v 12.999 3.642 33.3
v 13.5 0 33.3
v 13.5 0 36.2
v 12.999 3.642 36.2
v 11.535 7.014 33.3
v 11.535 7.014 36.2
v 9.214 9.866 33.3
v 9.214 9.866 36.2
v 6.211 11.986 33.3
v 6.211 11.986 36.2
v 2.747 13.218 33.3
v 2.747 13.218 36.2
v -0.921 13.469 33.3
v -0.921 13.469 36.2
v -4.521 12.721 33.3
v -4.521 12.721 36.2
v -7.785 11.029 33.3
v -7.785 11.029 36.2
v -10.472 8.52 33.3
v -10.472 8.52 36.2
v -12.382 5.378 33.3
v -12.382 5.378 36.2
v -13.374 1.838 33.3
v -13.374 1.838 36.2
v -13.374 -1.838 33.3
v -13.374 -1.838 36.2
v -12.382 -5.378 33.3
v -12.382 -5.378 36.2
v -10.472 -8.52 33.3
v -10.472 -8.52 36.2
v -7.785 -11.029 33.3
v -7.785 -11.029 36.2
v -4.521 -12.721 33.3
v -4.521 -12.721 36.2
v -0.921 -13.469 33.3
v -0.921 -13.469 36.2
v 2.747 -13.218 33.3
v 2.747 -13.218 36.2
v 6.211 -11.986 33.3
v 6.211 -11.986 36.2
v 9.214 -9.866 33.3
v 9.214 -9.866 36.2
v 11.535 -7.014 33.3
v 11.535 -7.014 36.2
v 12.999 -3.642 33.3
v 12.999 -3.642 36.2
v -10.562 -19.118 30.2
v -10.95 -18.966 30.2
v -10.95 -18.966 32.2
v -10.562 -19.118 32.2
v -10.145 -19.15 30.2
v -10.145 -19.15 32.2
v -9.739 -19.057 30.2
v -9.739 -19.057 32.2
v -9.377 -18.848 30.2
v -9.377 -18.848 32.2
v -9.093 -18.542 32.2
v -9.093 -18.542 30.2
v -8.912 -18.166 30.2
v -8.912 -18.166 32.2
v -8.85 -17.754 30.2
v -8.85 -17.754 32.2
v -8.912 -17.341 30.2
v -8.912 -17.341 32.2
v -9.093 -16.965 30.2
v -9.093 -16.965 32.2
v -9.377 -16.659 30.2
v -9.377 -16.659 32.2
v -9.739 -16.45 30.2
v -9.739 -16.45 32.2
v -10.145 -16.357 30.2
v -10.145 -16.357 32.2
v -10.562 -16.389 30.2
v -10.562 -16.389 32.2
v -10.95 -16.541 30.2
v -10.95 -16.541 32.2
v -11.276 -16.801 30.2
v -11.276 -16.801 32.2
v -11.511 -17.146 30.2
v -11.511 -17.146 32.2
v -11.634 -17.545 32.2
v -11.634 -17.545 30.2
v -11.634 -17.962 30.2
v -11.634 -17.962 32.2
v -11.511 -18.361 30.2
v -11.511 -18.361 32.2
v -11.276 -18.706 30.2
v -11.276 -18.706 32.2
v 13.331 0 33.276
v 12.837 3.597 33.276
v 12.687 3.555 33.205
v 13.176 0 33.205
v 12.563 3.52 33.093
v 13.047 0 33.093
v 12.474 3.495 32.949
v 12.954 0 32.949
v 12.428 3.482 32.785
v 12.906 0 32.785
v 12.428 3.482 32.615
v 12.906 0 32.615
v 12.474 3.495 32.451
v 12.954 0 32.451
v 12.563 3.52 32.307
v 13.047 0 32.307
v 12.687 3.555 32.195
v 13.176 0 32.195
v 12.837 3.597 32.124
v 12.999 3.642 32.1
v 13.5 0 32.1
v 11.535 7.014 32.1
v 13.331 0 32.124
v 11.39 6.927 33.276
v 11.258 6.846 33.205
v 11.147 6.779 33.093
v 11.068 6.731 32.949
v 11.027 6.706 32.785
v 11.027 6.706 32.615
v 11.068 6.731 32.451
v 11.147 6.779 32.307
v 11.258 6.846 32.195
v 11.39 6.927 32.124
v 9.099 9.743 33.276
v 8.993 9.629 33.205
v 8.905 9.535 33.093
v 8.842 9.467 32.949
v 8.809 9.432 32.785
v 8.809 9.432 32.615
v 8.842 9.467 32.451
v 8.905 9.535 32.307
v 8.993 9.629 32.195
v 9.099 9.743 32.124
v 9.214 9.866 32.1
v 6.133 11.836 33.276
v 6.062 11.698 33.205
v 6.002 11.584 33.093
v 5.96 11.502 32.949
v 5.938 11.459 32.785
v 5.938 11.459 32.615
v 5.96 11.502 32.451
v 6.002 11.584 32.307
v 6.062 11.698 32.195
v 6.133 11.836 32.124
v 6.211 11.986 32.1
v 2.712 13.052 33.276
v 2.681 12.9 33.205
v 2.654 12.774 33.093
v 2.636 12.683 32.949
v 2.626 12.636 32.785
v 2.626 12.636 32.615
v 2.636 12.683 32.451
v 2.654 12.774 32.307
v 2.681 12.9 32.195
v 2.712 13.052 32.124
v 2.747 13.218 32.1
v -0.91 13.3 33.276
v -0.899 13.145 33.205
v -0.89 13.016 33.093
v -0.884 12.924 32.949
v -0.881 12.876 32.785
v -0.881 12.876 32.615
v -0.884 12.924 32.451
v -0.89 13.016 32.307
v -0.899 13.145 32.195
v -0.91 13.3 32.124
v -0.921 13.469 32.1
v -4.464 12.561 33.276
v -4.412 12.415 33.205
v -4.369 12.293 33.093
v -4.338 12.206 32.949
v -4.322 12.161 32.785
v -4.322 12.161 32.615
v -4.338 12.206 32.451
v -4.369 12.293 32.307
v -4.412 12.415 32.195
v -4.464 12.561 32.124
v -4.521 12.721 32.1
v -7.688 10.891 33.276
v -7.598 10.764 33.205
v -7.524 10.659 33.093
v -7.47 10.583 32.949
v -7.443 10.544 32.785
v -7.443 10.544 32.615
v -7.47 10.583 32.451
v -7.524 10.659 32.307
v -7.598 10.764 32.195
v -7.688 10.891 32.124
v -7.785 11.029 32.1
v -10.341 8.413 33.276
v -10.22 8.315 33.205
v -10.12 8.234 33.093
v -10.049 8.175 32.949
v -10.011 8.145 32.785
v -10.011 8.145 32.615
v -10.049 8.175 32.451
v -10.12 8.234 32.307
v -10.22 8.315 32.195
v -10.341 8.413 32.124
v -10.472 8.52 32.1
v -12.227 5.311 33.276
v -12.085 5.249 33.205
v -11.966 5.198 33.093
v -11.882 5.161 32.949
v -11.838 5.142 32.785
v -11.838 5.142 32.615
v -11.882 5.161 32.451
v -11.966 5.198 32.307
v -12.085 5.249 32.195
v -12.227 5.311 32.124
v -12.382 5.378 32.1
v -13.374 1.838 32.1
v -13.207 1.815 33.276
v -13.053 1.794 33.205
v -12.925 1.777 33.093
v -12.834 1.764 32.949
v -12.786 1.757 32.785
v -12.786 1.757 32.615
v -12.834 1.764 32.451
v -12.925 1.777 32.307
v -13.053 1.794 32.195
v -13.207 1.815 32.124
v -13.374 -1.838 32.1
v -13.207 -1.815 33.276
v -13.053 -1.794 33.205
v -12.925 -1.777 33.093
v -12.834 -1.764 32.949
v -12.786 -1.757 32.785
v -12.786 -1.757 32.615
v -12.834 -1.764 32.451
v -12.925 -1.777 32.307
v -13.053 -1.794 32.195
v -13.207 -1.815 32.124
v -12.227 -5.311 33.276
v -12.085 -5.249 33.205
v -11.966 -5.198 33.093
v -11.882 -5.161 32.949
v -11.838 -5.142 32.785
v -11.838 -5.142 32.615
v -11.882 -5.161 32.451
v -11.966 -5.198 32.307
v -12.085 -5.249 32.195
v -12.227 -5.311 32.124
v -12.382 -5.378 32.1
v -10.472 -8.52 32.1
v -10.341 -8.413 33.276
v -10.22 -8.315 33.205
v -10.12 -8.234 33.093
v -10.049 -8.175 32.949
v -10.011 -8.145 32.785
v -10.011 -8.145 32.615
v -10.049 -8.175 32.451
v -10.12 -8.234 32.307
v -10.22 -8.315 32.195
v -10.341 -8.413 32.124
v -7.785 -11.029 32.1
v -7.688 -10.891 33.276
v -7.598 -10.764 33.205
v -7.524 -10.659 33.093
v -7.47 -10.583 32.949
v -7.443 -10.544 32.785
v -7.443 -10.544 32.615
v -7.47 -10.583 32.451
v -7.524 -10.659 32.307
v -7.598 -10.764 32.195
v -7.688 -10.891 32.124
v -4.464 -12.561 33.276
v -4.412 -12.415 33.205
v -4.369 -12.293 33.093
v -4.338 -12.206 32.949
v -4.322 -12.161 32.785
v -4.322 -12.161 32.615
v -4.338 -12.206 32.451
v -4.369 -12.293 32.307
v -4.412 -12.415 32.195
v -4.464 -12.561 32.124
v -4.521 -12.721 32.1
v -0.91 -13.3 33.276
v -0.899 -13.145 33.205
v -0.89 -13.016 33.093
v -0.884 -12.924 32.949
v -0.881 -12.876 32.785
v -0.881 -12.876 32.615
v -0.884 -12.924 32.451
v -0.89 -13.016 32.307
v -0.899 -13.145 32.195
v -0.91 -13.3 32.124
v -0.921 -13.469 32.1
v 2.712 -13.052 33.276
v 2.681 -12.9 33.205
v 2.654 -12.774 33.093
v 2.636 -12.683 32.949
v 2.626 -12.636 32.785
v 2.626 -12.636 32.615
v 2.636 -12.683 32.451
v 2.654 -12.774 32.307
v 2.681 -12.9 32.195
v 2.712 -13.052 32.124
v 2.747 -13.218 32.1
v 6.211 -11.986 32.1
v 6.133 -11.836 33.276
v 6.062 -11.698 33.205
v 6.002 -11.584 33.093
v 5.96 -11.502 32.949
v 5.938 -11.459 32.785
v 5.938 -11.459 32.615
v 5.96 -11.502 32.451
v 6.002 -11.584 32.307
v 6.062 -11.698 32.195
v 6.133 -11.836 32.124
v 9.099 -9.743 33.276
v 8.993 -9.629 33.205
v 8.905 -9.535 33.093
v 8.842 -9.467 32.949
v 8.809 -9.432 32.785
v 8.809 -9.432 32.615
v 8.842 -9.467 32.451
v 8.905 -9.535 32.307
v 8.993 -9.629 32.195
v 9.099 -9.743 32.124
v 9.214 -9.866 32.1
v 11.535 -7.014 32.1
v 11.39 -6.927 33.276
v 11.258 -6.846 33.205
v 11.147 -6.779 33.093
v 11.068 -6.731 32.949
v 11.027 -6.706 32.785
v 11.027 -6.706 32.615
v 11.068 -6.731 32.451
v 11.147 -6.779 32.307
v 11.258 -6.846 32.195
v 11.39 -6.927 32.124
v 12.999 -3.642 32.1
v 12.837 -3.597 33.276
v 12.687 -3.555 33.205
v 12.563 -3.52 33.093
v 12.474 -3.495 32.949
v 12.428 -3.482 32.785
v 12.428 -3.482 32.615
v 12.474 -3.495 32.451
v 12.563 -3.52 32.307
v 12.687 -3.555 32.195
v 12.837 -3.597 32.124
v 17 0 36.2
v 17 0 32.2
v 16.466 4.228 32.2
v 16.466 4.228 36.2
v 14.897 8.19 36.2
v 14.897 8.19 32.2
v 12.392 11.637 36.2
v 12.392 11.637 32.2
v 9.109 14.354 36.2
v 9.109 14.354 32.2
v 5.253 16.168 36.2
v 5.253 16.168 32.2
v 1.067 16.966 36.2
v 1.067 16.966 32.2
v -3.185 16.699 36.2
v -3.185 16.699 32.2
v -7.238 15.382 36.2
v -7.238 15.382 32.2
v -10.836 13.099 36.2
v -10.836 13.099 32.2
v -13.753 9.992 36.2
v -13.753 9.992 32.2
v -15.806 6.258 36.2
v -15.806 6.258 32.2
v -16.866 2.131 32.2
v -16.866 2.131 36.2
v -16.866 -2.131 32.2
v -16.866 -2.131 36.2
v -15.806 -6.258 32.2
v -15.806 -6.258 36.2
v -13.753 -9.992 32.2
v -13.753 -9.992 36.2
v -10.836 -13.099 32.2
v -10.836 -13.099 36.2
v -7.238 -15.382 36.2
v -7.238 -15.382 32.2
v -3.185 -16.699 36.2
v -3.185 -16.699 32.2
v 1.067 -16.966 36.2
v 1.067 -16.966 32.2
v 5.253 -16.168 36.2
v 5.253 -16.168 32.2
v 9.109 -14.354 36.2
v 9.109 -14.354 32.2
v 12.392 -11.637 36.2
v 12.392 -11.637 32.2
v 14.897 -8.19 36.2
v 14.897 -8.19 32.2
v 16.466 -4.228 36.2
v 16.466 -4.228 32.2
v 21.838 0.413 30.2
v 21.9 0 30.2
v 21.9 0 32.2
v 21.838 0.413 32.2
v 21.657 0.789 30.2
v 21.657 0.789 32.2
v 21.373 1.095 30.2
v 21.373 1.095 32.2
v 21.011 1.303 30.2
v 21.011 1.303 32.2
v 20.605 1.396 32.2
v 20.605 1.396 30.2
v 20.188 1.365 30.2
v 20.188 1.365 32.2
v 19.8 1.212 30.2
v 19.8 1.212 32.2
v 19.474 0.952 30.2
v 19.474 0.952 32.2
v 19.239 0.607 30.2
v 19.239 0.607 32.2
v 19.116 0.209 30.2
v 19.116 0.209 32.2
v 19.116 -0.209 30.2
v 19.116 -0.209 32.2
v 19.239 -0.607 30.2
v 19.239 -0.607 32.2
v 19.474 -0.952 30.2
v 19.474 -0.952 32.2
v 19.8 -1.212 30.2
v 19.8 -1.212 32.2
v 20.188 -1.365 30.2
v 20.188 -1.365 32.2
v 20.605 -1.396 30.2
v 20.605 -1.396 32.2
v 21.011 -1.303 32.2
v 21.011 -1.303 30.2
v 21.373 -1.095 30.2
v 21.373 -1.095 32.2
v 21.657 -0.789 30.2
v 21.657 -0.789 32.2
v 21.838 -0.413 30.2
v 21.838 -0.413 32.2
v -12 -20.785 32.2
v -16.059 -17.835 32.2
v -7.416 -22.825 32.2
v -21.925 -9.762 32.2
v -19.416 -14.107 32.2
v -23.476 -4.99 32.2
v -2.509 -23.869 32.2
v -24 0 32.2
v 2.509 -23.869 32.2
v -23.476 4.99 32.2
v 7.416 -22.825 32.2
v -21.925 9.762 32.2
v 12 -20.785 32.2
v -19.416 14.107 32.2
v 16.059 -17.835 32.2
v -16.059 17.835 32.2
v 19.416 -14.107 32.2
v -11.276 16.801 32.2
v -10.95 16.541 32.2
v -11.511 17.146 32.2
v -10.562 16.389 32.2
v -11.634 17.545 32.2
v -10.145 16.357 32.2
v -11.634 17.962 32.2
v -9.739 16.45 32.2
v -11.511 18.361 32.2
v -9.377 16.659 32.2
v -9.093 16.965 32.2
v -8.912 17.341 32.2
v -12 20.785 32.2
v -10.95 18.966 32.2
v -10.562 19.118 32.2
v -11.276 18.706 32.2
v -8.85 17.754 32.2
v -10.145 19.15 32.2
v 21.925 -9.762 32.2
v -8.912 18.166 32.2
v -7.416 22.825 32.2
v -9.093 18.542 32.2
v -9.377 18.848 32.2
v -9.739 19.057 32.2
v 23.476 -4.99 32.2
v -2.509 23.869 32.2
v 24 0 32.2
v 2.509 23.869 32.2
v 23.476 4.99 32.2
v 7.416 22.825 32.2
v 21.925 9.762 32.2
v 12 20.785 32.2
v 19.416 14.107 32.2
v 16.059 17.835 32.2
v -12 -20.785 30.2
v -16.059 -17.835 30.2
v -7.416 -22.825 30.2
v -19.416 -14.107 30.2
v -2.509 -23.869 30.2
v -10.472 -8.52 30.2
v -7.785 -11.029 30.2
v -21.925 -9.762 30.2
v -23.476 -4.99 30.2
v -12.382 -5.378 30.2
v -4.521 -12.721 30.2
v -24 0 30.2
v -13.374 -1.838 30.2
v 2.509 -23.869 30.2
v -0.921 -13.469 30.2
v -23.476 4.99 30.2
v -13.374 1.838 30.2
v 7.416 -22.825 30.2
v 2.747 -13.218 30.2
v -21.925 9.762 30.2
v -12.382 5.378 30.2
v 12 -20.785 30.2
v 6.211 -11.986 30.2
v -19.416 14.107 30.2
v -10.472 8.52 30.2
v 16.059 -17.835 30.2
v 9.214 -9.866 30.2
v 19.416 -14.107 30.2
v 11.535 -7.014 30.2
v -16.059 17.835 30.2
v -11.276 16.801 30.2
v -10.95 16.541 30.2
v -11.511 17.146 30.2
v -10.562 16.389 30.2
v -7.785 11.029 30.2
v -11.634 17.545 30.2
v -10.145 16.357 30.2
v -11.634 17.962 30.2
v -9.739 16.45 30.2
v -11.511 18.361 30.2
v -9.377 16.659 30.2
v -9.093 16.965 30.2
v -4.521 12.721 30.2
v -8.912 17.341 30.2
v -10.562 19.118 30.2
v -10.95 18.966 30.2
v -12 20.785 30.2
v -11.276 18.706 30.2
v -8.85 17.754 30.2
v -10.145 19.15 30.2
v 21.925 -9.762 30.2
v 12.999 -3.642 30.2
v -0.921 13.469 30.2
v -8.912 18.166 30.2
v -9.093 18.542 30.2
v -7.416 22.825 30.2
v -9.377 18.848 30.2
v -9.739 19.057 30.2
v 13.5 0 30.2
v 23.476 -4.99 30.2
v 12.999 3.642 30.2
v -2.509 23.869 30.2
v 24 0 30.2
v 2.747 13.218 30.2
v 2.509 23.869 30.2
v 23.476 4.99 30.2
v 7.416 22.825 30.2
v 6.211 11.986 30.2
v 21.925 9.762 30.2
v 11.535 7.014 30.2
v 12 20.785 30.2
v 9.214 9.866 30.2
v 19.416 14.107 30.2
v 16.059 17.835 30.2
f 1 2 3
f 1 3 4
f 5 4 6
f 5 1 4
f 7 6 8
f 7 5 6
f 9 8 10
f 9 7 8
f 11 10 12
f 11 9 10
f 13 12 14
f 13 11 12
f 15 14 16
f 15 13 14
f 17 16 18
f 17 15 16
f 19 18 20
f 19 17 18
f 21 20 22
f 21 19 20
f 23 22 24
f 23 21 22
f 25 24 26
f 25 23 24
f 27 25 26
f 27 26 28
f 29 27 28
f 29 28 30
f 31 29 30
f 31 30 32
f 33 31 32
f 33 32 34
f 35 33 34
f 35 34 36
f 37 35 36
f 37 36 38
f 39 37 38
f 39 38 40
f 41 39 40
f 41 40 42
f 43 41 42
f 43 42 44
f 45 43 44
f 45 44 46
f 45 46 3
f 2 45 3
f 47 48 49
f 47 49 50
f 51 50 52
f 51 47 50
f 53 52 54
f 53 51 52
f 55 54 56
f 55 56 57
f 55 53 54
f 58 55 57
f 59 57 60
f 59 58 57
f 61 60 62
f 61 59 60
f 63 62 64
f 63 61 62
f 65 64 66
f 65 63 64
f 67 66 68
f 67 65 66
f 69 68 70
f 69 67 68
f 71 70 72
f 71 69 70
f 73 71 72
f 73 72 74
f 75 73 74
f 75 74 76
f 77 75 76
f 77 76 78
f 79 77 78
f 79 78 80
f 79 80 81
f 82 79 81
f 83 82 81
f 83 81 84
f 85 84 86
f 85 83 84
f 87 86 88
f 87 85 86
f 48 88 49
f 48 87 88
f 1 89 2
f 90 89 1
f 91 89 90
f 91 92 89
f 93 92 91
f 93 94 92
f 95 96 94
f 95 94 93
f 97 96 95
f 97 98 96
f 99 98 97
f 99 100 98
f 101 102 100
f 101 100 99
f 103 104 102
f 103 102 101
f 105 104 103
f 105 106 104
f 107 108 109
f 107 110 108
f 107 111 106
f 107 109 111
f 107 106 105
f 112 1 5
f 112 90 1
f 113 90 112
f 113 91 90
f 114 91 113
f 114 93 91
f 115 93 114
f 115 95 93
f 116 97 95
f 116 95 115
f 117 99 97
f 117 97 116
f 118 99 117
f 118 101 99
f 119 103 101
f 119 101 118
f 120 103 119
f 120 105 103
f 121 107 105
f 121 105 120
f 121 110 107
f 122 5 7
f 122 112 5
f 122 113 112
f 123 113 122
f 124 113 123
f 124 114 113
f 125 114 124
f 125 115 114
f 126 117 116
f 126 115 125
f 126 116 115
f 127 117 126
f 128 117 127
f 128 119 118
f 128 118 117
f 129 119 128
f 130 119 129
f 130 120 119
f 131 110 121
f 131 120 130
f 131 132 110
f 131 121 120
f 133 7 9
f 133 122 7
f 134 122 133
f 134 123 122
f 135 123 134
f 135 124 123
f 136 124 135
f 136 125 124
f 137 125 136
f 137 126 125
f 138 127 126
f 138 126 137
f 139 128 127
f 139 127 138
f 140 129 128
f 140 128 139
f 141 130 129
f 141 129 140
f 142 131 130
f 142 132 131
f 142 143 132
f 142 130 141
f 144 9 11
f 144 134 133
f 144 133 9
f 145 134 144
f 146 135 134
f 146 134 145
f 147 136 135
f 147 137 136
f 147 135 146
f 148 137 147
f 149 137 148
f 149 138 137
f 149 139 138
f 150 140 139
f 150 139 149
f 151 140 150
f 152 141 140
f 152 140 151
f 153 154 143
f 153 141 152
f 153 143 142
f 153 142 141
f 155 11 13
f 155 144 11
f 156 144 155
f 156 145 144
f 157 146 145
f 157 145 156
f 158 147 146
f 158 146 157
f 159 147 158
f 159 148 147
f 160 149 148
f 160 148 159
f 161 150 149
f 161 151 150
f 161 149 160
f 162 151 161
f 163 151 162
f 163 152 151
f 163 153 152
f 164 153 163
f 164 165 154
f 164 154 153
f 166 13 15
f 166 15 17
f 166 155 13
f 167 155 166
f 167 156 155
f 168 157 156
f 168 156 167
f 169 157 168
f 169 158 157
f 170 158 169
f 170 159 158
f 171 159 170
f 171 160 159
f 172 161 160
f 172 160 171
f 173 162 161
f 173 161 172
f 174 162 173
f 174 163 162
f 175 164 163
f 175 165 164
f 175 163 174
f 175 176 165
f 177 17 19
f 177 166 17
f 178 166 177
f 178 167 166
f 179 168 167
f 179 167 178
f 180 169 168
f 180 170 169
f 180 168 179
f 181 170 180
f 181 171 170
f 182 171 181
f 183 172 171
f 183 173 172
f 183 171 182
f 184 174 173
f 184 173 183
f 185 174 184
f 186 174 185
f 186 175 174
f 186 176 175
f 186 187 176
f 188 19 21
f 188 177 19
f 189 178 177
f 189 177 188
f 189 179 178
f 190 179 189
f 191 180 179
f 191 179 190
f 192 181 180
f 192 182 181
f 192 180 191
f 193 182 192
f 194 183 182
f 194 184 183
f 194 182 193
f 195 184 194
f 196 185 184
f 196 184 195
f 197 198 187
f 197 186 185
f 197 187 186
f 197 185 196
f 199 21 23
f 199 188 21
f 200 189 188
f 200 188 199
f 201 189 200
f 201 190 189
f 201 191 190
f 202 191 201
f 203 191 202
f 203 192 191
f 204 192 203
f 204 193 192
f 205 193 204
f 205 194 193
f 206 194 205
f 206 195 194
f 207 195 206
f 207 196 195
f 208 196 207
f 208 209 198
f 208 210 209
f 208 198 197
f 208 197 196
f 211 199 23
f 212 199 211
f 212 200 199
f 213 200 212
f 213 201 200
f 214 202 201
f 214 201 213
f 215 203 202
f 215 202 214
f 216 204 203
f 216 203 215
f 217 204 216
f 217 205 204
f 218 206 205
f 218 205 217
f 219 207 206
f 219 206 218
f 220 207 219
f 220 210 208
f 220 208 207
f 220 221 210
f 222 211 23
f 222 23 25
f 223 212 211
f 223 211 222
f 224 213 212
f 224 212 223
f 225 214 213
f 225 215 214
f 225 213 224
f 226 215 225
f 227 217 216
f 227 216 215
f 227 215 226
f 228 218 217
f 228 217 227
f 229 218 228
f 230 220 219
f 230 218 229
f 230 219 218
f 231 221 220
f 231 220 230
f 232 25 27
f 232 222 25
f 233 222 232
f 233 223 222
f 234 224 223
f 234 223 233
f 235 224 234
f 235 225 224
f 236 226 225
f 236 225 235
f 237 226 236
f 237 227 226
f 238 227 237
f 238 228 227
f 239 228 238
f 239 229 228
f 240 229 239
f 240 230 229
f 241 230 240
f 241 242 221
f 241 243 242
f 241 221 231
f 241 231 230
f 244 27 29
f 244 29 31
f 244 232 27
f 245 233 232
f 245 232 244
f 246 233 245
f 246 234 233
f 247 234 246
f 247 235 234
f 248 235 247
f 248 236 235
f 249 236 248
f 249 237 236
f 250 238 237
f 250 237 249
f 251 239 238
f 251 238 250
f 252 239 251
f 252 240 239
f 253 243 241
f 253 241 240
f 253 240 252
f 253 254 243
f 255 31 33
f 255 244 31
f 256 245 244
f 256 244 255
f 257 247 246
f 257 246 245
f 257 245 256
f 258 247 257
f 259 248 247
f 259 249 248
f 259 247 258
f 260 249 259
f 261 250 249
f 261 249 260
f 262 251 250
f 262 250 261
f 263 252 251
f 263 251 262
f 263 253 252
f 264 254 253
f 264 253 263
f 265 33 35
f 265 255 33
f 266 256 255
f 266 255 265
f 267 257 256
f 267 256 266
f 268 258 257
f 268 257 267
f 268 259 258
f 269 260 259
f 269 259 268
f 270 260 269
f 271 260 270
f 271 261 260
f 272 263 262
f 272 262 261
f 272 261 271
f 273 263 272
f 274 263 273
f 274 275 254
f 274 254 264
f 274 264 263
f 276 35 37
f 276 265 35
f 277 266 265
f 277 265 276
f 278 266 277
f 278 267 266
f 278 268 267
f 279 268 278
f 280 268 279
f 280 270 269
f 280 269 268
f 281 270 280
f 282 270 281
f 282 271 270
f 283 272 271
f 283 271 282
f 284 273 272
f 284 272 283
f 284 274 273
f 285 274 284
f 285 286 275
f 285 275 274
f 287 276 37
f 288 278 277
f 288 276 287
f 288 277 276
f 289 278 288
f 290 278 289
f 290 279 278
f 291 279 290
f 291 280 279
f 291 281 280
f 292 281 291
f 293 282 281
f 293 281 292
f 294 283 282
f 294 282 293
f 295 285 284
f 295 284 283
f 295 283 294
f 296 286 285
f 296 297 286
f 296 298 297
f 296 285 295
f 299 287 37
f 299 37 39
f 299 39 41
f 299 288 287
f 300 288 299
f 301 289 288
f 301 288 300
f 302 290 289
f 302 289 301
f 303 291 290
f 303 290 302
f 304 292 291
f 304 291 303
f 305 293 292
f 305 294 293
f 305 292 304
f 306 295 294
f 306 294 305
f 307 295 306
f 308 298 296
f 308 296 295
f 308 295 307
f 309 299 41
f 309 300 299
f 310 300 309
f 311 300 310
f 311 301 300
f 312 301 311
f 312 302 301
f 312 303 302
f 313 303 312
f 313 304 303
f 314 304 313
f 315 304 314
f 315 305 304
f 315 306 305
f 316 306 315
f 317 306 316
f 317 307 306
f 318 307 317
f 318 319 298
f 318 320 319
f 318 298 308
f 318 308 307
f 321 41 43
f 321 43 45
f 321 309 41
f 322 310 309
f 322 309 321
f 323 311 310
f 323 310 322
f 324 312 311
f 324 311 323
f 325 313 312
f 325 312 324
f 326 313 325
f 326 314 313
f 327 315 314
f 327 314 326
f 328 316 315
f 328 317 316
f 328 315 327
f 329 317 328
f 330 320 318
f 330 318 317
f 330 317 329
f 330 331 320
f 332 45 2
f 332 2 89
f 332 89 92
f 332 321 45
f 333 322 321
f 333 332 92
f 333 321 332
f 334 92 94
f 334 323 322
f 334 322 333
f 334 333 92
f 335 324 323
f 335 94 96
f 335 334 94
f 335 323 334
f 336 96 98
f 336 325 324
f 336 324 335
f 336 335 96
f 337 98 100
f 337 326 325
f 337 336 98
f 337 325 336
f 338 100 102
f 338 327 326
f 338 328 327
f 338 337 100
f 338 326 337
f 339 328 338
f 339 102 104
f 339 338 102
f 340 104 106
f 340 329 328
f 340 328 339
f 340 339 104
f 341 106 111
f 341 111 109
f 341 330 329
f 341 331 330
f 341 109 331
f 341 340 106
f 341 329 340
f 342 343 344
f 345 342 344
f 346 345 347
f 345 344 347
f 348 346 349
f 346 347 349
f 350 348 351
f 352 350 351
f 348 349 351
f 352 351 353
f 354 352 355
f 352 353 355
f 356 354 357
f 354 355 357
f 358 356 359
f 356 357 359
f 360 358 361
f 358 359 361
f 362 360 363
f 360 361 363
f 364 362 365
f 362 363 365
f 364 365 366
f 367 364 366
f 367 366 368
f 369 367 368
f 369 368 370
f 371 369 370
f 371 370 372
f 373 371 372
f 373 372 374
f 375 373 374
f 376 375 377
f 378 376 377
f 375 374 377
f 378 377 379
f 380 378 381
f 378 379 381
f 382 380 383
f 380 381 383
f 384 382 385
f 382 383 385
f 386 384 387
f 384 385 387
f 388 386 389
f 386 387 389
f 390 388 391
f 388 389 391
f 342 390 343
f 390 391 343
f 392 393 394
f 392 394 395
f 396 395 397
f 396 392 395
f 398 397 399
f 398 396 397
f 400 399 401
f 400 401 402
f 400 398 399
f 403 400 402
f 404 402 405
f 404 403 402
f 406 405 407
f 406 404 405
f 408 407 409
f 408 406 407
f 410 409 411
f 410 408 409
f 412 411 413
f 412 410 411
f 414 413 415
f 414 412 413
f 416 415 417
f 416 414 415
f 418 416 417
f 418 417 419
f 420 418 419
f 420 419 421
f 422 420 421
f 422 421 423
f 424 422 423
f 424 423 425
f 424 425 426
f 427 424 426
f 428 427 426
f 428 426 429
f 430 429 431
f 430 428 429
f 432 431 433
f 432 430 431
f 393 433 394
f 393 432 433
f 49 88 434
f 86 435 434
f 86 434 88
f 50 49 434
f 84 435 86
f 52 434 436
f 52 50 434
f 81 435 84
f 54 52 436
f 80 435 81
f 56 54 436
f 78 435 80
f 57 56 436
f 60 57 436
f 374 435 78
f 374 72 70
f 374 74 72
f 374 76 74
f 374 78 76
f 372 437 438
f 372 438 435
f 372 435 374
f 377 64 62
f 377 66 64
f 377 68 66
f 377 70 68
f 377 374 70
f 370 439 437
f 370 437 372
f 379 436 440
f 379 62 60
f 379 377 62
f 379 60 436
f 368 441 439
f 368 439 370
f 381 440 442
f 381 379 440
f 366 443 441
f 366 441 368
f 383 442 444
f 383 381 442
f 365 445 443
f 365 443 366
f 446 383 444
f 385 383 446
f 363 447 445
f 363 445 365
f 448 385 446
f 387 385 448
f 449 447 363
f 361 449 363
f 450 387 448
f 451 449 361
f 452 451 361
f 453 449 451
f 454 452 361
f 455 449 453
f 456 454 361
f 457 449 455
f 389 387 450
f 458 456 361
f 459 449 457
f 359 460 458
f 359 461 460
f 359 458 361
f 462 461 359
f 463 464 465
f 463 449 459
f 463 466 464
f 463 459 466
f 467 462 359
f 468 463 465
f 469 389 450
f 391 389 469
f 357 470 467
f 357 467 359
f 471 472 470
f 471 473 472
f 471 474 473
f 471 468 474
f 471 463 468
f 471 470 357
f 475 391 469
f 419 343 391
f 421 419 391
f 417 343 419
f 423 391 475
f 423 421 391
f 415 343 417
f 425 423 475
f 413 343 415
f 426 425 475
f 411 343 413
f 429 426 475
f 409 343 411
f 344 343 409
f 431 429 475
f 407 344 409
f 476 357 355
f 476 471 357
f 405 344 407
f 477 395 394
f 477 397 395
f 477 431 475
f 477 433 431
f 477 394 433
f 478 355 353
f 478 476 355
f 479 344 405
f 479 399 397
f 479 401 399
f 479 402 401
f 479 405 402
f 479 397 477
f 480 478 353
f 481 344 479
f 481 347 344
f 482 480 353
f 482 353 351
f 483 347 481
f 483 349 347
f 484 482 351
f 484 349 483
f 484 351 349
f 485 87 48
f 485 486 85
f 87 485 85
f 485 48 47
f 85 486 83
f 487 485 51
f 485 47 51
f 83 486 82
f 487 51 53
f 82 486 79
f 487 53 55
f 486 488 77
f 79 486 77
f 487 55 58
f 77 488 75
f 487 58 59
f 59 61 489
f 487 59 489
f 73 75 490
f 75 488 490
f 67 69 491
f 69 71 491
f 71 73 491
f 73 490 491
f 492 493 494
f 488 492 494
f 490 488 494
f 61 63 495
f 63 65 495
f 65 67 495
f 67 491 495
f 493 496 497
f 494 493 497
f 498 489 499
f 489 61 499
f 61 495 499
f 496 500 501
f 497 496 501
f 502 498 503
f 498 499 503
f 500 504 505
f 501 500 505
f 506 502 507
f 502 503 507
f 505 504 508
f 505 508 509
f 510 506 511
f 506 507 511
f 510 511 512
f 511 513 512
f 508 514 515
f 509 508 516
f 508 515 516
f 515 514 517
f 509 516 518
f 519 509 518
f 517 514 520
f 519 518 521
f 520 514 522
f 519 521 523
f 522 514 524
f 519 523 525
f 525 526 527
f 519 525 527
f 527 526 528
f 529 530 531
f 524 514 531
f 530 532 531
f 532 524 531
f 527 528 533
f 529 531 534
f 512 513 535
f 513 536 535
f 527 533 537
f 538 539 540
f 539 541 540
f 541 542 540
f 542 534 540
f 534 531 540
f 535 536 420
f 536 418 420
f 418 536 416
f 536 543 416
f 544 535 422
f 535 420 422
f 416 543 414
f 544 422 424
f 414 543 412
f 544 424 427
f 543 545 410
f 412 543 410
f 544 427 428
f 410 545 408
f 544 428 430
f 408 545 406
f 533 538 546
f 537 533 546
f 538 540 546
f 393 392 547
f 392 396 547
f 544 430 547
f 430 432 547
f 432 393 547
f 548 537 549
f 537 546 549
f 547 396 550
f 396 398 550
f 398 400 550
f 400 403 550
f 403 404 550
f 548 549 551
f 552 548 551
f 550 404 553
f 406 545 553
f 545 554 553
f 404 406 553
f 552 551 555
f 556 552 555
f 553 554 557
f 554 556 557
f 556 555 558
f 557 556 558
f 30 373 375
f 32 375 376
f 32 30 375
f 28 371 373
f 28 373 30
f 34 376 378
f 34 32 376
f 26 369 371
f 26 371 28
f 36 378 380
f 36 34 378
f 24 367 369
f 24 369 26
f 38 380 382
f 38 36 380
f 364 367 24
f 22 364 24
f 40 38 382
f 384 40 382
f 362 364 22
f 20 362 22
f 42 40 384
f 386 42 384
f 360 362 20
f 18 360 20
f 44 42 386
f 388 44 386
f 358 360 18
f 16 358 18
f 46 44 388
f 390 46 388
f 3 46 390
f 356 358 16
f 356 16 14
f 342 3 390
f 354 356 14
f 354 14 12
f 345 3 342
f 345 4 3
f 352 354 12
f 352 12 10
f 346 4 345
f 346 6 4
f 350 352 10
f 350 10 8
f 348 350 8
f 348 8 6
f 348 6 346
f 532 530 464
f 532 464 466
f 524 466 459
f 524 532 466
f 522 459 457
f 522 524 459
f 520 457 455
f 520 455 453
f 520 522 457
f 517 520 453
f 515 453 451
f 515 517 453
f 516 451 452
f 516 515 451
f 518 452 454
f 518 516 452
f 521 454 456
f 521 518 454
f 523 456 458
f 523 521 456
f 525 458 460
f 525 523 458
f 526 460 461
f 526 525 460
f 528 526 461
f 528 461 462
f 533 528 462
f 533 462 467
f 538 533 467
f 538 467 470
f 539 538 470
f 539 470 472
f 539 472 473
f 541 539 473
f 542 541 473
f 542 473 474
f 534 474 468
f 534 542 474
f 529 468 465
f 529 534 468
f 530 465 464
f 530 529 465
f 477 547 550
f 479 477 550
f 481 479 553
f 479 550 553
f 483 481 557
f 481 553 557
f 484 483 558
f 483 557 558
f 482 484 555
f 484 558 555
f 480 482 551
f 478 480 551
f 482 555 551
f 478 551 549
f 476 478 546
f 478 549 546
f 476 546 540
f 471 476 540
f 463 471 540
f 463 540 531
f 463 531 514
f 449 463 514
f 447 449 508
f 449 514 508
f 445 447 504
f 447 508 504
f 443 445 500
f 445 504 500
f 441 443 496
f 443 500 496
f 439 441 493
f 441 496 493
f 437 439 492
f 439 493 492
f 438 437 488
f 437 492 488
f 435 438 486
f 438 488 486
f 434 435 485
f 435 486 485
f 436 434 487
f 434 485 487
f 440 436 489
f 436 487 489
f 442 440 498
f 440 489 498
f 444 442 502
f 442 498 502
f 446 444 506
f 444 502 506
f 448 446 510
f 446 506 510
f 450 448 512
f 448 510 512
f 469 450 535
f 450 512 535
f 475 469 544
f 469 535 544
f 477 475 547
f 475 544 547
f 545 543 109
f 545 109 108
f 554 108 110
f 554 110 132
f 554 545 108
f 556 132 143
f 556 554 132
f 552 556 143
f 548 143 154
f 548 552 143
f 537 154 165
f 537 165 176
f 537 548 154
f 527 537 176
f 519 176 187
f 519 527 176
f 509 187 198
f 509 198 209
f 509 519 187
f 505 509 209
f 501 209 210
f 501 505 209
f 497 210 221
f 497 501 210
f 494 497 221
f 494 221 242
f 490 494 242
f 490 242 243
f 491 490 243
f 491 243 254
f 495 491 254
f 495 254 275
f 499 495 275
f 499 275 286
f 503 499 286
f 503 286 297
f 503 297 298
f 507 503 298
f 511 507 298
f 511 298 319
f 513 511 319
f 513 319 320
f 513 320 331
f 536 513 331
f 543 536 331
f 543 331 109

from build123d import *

# Parameters (mm, degrees)
TORUS004_R        = 0.6
CYLINDER068_R     = 1.4
CYLINDER068_DEPTH = 2
ARRAY014_COUNT    = 3
CYLINDER067_R     = 13.5
CYLINDER067_DEPTH = 6
CYLINDER066_R     = 24
CYLINDER066_DEPTH = 2
CYLINDER065_R     = 17
CYLINDER065_DEPTH = 4


with BuildPart() as pot_rim_clip:
    # Torus004 → Torus004 (revolve)
    with BuildSketch(Plane(origin=(0, 0, 2.5), x_dir=(1, 0, 0), z_dir=(0, -1, 0))):
        with Locations((13.5, 0)):
            Circle(TORUS004_R)
    revolve(axis=Axis((0, 0, 2.5), (0, 0, 1)))


with BuildPart() as screw_holes001:
    # Cylinder068 → Cylinder068 (new body)
    with BuildSketch(Plane(origin=(20.5, 0, 0), x_dir=(1, 0, 0), z_dir=(0, 0, 1))):
        Circle(CYLINDER068_R)
    extrude(amount=CYLINDER068_DEPTH)

    # Array014: screw-holes001 ×3 about axis
    array014_axis = Axis((0, 0, 0), (0, 0, 1))


with BuildPart() as screw_holes001_1:
    add(screw_holes001.part)
    for i in range(1, ARRAY014_COUNT):
        add(screw_holes001.part.rotate(array014_axis, i * 360 / ARRAY014_COUNT))


with BuildPart() as pot_thread_hole001:
    # Cylinder067 → Cylinder067 (new body)
    with BuildSketch(Plane.XY):
        Circle(CYLINDER067_R)
    extrude(amount=CYLINDER067_DEPTH)


with BuildPart() as brim001:
    # Cylinder066 → Cylinder066 (new body)
    with BuildSketch(Plane.XY):
        Circle(CYLINDER066_R)
    extrude(amount=CYLINDER066_DEPTH)


with BuildPart() as pot_mount002:
    # Cylinder065 → Cylinder065 (new body)
    with BuildSketch(Plane.XY.offset(2)):
        Circle(CYLINDER065_R)
    extrude(amount=CYLINDER065_DEPTH)

    # Fusion028: union brim001
    add(brim001.part)

    # Cut049: cut pot-thread-hole001
    add(pot_thread_hole001.part, mode=Mode.SUBTRACT)

    # Cut053: cut screw-holes001
    add(screw_holes001_1.part, mode=Mode.SUBTRACT)

    # Fusion029: union pot-rim-clip
    add(pot_rim_clip.part)


with BuildPart() as pot_mount002_1:
    # Fusion029 placement: moved
    add(pot_mount002.part.moved(Location((0, 0, 30.2))))


solid = pot_mount002_1.part
